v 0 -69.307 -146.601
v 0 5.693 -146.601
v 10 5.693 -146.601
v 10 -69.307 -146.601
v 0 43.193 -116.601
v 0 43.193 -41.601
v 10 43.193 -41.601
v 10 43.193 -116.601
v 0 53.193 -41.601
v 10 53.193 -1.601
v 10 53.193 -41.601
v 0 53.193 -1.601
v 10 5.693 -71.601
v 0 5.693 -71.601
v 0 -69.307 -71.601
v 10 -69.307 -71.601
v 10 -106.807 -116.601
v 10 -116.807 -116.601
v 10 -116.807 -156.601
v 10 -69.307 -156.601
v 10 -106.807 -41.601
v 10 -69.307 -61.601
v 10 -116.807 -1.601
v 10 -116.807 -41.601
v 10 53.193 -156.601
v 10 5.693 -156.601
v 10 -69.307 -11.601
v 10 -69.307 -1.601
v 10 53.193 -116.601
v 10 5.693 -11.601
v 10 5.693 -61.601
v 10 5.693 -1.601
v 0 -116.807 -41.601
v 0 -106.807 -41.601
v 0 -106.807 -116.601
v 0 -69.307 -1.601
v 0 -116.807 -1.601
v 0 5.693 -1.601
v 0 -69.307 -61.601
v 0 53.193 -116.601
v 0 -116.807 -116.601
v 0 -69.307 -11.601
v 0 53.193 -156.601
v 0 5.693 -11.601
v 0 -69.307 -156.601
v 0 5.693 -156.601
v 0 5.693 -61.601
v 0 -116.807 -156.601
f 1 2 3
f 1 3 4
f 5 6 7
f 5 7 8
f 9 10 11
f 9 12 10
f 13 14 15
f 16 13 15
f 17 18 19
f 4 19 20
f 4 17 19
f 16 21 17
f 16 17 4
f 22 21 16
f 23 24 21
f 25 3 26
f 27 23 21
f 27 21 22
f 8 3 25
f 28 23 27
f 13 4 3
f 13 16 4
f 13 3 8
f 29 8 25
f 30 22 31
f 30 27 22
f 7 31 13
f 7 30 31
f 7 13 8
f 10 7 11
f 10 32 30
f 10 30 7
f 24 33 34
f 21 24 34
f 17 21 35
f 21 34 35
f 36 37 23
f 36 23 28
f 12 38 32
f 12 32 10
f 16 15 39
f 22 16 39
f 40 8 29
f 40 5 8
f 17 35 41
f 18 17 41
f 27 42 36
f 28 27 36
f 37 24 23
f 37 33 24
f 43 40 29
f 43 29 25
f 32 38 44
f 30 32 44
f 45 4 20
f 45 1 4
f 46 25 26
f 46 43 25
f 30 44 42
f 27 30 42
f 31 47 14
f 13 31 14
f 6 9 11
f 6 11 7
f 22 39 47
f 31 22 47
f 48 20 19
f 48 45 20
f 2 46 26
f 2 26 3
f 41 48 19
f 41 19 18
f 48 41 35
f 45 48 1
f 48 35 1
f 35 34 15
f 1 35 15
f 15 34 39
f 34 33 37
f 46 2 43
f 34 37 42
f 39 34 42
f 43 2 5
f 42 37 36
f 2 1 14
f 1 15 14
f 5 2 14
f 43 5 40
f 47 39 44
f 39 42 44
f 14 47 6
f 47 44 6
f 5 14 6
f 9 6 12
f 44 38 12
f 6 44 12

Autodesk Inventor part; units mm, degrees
ref_plane "YZ Plane" through (0, 0, 0) normal (1, 0, 0) x (0, 1, 0)
ref_plane "XZ Plane" through (0, 0, 0) normal (0, 1, 0) x (-1, 0, 0)
ref_plane "XY Plane" through (0, 0, 0) normal (0, 0, 1) x (1, 0, 0)
sketch "Skizze1" plane through (0, 0, 0) normal (1, 0, 0) x (0, 1, 0)
  line L0 (5.6933, -1.6012) -> (5.6933, -11.6012)
  line L1 (5.6933, -11.6012) -> (-69.3067, -11.6012)
  line L2 (-69.3067, -11.6012) -> (-69.3067, -1.6012)
  line L3 (-116.8067, -1.6012) -> (-69.3067, -1.6012)
  line L4 (5.6933, -1.6012) -> (53.1933, -1.6012)
  line L5 (5.6933, -156.6012) -> (5.6933, -146.6012)
  line L6 (5.6933, -146.6012) -> (-69.3067, -146.6012)
  line L7 (-69.3067, -146.6012) -> (-69.3067, -156.6012)
  line L8 (-69.3067, -61.6012) -> (5.6933, -61.6012)
  line L9 (5.6933, -61.6012) -> (5.6933, -71.6012)
  line L10 (5.6933, -71.6012) -> (-69.3067, -71.6012)
  line L11 (-69.3067, -71.6012) -> (-69.3067, -61.6012)
  line L12 (53.1933, -156.6012) -> (5.6933, -156.6012)
  line L13 (-69.3067, -156.6012) -> (-116.8067, -156.6012)
  line L14 (-116.8067, -41.6012) -> (-106.8067, -41.6012)
  line L15 (-106.8067, -41.6012) -> (-106.8067, -116.6012)
  line L16 (-106.8067, -116.6012) -> (-116.8067, -116.6012)
  line L17 (-116.8067, -156.6012) -> (-116.8067, -116.6012)
  line L18 (-116.8067, -41.6012) -> (-116.8067, -1.6012)
  line L19 (53.1933, -41.6012) -> (43.1933, -41.6012)
  line L20 (43.1933, -41.6012) -> (43.1933, -116.6012)
  line L21 (43.1933, -116.6012) -> (53.1933, -116.6012)
  line L22 (53.1933, -1.6012) -> (53.1933, -41.6012)
  line L23 (53.1933, -116.6012) -> (53.1933, -156.6012)
  point P0 (0, 0)
  dimension "d0" = 170
  dimension "d1" = 155
  dimension "d2" = 75
  dimension "d3" = 10
  dimension "d5" = 75
  dimension "d6" = 10
  dimension "d8" = 75
  dimension "d9" = 10
  dimension "d10" = 50
  dimension "d14" = 0
  dimension "d15" = 0
  dimension "d16" = 10
  dimension "d17" = 75
  dimension "d18" = 40
  dimension "d19" = 0
  dimension "d20" = 10
  dimension "d23" = 40
  dimension "d24" = 10
  dimension "d25" = 47.5
  dimension "d26" = 37.5
  dimension "d27" = 40
  dimension "d28" = 75
  dimension "d29" = 170
extrude "Extrusion1" add sketch "Skizze1" along normal blind 10
properties part number "Platte2-Seite"
